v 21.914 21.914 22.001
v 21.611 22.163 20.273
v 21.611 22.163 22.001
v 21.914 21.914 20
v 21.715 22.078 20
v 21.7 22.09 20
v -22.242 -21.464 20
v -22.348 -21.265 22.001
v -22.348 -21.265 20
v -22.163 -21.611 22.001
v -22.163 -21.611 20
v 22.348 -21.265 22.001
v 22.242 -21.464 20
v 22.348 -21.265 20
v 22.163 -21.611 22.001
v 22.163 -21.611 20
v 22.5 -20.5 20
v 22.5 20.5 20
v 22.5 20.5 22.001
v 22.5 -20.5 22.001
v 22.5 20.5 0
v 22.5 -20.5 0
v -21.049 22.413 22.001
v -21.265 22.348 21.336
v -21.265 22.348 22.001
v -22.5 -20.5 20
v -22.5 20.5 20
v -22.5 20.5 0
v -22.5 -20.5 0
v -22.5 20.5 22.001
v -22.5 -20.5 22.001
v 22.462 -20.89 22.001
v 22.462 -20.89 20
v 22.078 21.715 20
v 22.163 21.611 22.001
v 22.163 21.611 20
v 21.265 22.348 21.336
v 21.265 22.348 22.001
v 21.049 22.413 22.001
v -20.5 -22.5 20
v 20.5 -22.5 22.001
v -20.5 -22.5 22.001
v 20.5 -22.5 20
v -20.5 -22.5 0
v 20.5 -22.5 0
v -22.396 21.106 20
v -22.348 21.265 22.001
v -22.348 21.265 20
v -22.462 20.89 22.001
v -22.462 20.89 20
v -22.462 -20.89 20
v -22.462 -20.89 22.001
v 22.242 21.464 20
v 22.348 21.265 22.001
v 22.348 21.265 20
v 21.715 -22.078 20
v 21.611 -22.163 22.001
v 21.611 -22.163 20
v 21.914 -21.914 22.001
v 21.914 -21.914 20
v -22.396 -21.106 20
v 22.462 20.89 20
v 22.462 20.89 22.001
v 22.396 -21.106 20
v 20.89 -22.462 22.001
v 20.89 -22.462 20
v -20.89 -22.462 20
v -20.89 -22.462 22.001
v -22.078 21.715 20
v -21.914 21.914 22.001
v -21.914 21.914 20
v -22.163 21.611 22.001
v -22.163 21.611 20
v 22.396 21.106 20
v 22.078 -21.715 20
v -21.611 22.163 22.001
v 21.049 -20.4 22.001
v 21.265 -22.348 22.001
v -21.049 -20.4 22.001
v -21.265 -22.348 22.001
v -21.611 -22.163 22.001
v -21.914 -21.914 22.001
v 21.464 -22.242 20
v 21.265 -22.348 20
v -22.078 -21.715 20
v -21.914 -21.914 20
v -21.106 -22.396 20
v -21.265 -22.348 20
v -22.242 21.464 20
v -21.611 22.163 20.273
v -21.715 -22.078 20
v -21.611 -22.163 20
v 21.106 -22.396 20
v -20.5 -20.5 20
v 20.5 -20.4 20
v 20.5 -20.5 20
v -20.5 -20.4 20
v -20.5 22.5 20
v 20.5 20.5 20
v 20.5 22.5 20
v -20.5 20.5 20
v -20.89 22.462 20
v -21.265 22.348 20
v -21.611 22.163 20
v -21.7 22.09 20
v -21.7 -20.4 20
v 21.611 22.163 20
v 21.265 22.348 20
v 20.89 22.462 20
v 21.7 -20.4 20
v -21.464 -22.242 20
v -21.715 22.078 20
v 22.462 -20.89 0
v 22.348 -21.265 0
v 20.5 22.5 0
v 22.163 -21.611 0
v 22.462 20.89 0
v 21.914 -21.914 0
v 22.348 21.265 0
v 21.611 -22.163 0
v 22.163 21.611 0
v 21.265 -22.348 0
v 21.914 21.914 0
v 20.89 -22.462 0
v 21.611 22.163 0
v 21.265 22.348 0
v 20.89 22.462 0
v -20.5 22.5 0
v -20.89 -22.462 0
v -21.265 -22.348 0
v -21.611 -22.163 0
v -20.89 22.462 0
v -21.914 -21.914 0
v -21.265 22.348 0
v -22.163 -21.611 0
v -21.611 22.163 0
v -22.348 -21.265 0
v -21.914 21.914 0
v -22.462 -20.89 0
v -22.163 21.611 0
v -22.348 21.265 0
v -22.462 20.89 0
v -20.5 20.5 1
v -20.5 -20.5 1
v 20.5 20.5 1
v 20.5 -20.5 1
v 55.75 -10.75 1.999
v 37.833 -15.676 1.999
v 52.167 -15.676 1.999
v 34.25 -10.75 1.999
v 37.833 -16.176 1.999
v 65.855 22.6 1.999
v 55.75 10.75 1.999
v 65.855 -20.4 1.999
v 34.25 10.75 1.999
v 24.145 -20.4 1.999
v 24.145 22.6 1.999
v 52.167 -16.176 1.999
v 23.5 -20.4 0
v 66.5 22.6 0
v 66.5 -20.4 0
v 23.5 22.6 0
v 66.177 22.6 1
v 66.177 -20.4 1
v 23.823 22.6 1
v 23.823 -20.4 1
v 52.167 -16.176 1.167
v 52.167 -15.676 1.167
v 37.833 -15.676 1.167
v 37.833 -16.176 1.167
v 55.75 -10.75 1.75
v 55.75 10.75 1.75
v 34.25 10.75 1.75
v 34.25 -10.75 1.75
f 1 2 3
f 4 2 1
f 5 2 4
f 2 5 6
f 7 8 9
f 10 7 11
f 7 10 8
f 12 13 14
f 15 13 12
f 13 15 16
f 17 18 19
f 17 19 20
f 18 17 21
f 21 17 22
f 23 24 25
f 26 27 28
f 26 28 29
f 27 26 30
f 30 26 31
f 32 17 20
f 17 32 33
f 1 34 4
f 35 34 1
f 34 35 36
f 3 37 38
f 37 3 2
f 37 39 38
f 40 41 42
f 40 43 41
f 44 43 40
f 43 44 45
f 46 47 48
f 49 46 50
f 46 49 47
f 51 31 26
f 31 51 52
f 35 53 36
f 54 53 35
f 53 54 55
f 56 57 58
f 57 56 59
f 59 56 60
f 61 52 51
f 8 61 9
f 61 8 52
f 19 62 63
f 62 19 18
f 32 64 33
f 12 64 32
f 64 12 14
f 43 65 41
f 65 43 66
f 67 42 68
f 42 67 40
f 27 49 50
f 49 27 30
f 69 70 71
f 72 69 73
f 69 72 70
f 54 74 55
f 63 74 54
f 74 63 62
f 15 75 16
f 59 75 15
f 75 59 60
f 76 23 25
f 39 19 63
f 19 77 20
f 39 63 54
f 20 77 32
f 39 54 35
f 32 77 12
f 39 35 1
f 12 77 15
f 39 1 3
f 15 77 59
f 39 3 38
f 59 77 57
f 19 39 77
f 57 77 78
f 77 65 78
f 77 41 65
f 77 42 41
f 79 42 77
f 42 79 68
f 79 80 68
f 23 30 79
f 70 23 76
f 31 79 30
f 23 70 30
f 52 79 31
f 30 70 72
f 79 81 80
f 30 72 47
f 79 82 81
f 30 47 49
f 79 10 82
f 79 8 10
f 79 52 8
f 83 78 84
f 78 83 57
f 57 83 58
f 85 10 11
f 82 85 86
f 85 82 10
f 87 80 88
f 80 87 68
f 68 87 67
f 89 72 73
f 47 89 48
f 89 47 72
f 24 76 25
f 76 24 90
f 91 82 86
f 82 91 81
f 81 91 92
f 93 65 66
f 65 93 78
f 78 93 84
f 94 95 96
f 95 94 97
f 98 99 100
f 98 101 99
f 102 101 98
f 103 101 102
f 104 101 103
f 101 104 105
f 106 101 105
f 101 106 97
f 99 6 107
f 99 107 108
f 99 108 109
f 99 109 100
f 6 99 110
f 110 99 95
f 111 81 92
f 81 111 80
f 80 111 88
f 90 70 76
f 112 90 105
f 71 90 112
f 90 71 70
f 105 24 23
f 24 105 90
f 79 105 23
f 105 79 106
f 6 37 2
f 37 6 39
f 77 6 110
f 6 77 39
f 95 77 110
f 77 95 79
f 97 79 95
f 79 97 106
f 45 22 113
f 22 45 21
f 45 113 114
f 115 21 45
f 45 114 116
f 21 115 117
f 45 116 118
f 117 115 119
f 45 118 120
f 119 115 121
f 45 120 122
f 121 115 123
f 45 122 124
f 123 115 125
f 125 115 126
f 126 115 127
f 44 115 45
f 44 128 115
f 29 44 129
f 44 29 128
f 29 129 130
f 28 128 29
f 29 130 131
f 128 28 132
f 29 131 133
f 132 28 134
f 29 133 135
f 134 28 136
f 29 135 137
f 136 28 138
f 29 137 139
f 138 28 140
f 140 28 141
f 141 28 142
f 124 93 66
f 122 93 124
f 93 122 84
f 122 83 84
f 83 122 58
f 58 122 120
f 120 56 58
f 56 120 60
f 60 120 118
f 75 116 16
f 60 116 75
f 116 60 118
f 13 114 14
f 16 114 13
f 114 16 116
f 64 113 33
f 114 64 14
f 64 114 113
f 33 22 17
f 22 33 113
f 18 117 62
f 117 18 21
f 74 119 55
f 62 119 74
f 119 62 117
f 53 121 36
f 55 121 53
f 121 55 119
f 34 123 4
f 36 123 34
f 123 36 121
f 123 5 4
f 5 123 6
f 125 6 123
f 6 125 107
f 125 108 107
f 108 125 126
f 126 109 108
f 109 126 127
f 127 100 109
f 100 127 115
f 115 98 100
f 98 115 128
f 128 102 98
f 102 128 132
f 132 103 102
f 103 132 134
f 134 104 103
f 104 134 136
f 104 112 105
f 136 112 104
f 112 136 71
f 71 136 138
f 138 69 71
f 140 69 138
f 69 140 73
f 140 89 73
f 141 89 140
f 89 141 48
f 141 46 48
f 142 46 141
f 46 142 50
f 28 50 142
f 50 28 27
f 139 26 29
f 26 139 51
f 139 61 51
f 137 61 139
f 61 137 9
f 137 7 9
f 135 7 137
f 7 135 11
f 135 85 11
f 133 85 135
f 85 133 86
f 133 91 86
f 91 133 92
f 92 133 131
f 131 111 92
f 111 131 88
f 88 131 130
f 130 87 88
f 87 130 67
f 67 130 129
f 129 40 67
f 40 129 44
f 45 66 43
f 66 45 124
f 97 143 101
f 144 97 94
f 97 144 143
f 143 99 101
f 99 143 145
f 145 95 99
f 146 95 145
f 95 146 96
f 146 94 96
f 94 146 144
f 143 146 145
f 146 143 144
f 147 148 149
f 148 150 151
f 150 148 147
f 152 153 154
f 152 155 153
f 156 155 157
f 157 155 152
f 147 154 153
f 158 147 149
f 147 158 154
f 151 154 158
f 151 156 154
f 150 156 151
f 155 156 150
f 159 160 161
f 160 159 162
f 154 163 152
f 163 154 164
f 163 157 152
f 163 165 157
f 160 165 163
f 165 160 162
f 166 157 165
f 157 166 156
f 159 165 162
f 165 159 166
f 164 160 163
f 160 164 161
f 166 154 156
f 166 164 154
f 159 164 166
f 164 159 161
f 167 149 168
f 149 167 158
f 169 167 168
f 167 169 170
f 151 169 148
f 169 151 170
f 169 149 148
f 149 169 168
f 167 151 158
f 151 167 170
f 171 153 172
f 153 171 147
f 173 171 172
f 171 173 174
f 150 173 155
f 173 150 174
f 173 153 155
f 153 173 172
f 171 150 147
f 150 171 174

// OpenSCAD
// Box builder with angled sliding lid.
// Has potential recess for label and fingernail grip to open.


// preview[view:north west, tilt:top diagonal]

// Width of Box
Box_x = 43;
// Length of Box
Box_y = 43;
// Height of Box
Box_z = 22; 
Wall_thickness = 2;  //[2:0.5:10]
Floor_thickness = 1;
Lid_thickness = 2;   //[2:0.5:10]
// Add inset for a Label
Lid_inset = "yes"; // [yes,no]
// Fingernail recess to ease opening lid
Grip_recess = "yes"; // [yes,no]

// Amount of play in the lid to fit well.
Looseness = 0.2;  //[0:0.1:1]
//
Show_assembled = "no"; // [yes,no]

/* [Hidden] */
//Lid scale (effective overhang)
lid_scale = 0.97;
fingernail_width = 0.5;

Delta = 0.1;     // to get good overlaps for real objects
roundness = 32;  // for curve res.
epsilon = 0.001; // for minkowski lid height :(

// Lid
module lid(extra_x=Looseness, extra_z=Delta) {
	translate([0,Wall_thickness/2+Delta,-Lid_thickness/2-epsilon/2])
	linear_extrude(height=Lid_thickness+extra_z*2, scale=[lid_scale,1])
		square(size=[Box_x+extra_x*2,Box_y], center=true);
}

// undercut ridge on top of box to hold lid
module lid_ridge(x,y) {
	difference() {
		// the surround
		minkowski(){
			cube(size=[x,y,Lid_thickness], center=true);
			cylinder(h=epsilon, r=Wall_thickness, $fn=roundness); // increases lid height by 2*epsilon
		}
		// minus the lid
		lid(Looseness, epsilon);
	}
}

// helper hole to open lid.
module fingernail_helper() {
	cube(size=[Box_x/3, fingernail_width,Lid_thickness/2], center=true);
}


// box
module box() {
	x = Box_x-Wall_thickness;
	y = Box_y-Wall_thickness;
	linear_extrude(height=Box_z-Lid_thickness, convexity=4)
	difference() {
		offset(r=Wall_thickness, $fn=roundness) 
			square(size=[x, y], center=true);
		square(size=[x, y], center=true);
	}
	// floor
	translate([0,0,Floor_thickness/2])
		cube(size=[x+Delta, y+Delta,Floor_thickness],center=true);
	// Top ridge of lid
	translate([0,0,Box_z-Lid_thickness/2])
		lid_ridge(x,y);
}


//-------------------
// Build the box
box();
// Build the Lid
tz = (Show_assembled == "yes") ? Box_z-Lid_thickness/2 : Lid_thickness/2;
tx = (Show_assembled == "no") ? Box_x+Wall_thickness  : 0;
ty = (Show_assembled == "yes") ? Box_y/3  : 0;
lid_color = (Show_assembled == "yes") ? [0.7,0.7,0] : 0;
color(lid_color)
translate([tx,ty,tz])
	difference() {
		lid(0,0);
		// subtract fingernail recess
		if (Grip_recess=="yes") {
			translate([0,-Box_y/2.7,Lid_thickness/3])
				fingernail_helper();
		}
		// subtract inset
		if (Lid_inset=="yes") {
			translate([0,0,Lid_thickness/2])
				cube(size=[Box_x/2, Box_y/2,Lid_thickness/4], center=true);
		}
	}
